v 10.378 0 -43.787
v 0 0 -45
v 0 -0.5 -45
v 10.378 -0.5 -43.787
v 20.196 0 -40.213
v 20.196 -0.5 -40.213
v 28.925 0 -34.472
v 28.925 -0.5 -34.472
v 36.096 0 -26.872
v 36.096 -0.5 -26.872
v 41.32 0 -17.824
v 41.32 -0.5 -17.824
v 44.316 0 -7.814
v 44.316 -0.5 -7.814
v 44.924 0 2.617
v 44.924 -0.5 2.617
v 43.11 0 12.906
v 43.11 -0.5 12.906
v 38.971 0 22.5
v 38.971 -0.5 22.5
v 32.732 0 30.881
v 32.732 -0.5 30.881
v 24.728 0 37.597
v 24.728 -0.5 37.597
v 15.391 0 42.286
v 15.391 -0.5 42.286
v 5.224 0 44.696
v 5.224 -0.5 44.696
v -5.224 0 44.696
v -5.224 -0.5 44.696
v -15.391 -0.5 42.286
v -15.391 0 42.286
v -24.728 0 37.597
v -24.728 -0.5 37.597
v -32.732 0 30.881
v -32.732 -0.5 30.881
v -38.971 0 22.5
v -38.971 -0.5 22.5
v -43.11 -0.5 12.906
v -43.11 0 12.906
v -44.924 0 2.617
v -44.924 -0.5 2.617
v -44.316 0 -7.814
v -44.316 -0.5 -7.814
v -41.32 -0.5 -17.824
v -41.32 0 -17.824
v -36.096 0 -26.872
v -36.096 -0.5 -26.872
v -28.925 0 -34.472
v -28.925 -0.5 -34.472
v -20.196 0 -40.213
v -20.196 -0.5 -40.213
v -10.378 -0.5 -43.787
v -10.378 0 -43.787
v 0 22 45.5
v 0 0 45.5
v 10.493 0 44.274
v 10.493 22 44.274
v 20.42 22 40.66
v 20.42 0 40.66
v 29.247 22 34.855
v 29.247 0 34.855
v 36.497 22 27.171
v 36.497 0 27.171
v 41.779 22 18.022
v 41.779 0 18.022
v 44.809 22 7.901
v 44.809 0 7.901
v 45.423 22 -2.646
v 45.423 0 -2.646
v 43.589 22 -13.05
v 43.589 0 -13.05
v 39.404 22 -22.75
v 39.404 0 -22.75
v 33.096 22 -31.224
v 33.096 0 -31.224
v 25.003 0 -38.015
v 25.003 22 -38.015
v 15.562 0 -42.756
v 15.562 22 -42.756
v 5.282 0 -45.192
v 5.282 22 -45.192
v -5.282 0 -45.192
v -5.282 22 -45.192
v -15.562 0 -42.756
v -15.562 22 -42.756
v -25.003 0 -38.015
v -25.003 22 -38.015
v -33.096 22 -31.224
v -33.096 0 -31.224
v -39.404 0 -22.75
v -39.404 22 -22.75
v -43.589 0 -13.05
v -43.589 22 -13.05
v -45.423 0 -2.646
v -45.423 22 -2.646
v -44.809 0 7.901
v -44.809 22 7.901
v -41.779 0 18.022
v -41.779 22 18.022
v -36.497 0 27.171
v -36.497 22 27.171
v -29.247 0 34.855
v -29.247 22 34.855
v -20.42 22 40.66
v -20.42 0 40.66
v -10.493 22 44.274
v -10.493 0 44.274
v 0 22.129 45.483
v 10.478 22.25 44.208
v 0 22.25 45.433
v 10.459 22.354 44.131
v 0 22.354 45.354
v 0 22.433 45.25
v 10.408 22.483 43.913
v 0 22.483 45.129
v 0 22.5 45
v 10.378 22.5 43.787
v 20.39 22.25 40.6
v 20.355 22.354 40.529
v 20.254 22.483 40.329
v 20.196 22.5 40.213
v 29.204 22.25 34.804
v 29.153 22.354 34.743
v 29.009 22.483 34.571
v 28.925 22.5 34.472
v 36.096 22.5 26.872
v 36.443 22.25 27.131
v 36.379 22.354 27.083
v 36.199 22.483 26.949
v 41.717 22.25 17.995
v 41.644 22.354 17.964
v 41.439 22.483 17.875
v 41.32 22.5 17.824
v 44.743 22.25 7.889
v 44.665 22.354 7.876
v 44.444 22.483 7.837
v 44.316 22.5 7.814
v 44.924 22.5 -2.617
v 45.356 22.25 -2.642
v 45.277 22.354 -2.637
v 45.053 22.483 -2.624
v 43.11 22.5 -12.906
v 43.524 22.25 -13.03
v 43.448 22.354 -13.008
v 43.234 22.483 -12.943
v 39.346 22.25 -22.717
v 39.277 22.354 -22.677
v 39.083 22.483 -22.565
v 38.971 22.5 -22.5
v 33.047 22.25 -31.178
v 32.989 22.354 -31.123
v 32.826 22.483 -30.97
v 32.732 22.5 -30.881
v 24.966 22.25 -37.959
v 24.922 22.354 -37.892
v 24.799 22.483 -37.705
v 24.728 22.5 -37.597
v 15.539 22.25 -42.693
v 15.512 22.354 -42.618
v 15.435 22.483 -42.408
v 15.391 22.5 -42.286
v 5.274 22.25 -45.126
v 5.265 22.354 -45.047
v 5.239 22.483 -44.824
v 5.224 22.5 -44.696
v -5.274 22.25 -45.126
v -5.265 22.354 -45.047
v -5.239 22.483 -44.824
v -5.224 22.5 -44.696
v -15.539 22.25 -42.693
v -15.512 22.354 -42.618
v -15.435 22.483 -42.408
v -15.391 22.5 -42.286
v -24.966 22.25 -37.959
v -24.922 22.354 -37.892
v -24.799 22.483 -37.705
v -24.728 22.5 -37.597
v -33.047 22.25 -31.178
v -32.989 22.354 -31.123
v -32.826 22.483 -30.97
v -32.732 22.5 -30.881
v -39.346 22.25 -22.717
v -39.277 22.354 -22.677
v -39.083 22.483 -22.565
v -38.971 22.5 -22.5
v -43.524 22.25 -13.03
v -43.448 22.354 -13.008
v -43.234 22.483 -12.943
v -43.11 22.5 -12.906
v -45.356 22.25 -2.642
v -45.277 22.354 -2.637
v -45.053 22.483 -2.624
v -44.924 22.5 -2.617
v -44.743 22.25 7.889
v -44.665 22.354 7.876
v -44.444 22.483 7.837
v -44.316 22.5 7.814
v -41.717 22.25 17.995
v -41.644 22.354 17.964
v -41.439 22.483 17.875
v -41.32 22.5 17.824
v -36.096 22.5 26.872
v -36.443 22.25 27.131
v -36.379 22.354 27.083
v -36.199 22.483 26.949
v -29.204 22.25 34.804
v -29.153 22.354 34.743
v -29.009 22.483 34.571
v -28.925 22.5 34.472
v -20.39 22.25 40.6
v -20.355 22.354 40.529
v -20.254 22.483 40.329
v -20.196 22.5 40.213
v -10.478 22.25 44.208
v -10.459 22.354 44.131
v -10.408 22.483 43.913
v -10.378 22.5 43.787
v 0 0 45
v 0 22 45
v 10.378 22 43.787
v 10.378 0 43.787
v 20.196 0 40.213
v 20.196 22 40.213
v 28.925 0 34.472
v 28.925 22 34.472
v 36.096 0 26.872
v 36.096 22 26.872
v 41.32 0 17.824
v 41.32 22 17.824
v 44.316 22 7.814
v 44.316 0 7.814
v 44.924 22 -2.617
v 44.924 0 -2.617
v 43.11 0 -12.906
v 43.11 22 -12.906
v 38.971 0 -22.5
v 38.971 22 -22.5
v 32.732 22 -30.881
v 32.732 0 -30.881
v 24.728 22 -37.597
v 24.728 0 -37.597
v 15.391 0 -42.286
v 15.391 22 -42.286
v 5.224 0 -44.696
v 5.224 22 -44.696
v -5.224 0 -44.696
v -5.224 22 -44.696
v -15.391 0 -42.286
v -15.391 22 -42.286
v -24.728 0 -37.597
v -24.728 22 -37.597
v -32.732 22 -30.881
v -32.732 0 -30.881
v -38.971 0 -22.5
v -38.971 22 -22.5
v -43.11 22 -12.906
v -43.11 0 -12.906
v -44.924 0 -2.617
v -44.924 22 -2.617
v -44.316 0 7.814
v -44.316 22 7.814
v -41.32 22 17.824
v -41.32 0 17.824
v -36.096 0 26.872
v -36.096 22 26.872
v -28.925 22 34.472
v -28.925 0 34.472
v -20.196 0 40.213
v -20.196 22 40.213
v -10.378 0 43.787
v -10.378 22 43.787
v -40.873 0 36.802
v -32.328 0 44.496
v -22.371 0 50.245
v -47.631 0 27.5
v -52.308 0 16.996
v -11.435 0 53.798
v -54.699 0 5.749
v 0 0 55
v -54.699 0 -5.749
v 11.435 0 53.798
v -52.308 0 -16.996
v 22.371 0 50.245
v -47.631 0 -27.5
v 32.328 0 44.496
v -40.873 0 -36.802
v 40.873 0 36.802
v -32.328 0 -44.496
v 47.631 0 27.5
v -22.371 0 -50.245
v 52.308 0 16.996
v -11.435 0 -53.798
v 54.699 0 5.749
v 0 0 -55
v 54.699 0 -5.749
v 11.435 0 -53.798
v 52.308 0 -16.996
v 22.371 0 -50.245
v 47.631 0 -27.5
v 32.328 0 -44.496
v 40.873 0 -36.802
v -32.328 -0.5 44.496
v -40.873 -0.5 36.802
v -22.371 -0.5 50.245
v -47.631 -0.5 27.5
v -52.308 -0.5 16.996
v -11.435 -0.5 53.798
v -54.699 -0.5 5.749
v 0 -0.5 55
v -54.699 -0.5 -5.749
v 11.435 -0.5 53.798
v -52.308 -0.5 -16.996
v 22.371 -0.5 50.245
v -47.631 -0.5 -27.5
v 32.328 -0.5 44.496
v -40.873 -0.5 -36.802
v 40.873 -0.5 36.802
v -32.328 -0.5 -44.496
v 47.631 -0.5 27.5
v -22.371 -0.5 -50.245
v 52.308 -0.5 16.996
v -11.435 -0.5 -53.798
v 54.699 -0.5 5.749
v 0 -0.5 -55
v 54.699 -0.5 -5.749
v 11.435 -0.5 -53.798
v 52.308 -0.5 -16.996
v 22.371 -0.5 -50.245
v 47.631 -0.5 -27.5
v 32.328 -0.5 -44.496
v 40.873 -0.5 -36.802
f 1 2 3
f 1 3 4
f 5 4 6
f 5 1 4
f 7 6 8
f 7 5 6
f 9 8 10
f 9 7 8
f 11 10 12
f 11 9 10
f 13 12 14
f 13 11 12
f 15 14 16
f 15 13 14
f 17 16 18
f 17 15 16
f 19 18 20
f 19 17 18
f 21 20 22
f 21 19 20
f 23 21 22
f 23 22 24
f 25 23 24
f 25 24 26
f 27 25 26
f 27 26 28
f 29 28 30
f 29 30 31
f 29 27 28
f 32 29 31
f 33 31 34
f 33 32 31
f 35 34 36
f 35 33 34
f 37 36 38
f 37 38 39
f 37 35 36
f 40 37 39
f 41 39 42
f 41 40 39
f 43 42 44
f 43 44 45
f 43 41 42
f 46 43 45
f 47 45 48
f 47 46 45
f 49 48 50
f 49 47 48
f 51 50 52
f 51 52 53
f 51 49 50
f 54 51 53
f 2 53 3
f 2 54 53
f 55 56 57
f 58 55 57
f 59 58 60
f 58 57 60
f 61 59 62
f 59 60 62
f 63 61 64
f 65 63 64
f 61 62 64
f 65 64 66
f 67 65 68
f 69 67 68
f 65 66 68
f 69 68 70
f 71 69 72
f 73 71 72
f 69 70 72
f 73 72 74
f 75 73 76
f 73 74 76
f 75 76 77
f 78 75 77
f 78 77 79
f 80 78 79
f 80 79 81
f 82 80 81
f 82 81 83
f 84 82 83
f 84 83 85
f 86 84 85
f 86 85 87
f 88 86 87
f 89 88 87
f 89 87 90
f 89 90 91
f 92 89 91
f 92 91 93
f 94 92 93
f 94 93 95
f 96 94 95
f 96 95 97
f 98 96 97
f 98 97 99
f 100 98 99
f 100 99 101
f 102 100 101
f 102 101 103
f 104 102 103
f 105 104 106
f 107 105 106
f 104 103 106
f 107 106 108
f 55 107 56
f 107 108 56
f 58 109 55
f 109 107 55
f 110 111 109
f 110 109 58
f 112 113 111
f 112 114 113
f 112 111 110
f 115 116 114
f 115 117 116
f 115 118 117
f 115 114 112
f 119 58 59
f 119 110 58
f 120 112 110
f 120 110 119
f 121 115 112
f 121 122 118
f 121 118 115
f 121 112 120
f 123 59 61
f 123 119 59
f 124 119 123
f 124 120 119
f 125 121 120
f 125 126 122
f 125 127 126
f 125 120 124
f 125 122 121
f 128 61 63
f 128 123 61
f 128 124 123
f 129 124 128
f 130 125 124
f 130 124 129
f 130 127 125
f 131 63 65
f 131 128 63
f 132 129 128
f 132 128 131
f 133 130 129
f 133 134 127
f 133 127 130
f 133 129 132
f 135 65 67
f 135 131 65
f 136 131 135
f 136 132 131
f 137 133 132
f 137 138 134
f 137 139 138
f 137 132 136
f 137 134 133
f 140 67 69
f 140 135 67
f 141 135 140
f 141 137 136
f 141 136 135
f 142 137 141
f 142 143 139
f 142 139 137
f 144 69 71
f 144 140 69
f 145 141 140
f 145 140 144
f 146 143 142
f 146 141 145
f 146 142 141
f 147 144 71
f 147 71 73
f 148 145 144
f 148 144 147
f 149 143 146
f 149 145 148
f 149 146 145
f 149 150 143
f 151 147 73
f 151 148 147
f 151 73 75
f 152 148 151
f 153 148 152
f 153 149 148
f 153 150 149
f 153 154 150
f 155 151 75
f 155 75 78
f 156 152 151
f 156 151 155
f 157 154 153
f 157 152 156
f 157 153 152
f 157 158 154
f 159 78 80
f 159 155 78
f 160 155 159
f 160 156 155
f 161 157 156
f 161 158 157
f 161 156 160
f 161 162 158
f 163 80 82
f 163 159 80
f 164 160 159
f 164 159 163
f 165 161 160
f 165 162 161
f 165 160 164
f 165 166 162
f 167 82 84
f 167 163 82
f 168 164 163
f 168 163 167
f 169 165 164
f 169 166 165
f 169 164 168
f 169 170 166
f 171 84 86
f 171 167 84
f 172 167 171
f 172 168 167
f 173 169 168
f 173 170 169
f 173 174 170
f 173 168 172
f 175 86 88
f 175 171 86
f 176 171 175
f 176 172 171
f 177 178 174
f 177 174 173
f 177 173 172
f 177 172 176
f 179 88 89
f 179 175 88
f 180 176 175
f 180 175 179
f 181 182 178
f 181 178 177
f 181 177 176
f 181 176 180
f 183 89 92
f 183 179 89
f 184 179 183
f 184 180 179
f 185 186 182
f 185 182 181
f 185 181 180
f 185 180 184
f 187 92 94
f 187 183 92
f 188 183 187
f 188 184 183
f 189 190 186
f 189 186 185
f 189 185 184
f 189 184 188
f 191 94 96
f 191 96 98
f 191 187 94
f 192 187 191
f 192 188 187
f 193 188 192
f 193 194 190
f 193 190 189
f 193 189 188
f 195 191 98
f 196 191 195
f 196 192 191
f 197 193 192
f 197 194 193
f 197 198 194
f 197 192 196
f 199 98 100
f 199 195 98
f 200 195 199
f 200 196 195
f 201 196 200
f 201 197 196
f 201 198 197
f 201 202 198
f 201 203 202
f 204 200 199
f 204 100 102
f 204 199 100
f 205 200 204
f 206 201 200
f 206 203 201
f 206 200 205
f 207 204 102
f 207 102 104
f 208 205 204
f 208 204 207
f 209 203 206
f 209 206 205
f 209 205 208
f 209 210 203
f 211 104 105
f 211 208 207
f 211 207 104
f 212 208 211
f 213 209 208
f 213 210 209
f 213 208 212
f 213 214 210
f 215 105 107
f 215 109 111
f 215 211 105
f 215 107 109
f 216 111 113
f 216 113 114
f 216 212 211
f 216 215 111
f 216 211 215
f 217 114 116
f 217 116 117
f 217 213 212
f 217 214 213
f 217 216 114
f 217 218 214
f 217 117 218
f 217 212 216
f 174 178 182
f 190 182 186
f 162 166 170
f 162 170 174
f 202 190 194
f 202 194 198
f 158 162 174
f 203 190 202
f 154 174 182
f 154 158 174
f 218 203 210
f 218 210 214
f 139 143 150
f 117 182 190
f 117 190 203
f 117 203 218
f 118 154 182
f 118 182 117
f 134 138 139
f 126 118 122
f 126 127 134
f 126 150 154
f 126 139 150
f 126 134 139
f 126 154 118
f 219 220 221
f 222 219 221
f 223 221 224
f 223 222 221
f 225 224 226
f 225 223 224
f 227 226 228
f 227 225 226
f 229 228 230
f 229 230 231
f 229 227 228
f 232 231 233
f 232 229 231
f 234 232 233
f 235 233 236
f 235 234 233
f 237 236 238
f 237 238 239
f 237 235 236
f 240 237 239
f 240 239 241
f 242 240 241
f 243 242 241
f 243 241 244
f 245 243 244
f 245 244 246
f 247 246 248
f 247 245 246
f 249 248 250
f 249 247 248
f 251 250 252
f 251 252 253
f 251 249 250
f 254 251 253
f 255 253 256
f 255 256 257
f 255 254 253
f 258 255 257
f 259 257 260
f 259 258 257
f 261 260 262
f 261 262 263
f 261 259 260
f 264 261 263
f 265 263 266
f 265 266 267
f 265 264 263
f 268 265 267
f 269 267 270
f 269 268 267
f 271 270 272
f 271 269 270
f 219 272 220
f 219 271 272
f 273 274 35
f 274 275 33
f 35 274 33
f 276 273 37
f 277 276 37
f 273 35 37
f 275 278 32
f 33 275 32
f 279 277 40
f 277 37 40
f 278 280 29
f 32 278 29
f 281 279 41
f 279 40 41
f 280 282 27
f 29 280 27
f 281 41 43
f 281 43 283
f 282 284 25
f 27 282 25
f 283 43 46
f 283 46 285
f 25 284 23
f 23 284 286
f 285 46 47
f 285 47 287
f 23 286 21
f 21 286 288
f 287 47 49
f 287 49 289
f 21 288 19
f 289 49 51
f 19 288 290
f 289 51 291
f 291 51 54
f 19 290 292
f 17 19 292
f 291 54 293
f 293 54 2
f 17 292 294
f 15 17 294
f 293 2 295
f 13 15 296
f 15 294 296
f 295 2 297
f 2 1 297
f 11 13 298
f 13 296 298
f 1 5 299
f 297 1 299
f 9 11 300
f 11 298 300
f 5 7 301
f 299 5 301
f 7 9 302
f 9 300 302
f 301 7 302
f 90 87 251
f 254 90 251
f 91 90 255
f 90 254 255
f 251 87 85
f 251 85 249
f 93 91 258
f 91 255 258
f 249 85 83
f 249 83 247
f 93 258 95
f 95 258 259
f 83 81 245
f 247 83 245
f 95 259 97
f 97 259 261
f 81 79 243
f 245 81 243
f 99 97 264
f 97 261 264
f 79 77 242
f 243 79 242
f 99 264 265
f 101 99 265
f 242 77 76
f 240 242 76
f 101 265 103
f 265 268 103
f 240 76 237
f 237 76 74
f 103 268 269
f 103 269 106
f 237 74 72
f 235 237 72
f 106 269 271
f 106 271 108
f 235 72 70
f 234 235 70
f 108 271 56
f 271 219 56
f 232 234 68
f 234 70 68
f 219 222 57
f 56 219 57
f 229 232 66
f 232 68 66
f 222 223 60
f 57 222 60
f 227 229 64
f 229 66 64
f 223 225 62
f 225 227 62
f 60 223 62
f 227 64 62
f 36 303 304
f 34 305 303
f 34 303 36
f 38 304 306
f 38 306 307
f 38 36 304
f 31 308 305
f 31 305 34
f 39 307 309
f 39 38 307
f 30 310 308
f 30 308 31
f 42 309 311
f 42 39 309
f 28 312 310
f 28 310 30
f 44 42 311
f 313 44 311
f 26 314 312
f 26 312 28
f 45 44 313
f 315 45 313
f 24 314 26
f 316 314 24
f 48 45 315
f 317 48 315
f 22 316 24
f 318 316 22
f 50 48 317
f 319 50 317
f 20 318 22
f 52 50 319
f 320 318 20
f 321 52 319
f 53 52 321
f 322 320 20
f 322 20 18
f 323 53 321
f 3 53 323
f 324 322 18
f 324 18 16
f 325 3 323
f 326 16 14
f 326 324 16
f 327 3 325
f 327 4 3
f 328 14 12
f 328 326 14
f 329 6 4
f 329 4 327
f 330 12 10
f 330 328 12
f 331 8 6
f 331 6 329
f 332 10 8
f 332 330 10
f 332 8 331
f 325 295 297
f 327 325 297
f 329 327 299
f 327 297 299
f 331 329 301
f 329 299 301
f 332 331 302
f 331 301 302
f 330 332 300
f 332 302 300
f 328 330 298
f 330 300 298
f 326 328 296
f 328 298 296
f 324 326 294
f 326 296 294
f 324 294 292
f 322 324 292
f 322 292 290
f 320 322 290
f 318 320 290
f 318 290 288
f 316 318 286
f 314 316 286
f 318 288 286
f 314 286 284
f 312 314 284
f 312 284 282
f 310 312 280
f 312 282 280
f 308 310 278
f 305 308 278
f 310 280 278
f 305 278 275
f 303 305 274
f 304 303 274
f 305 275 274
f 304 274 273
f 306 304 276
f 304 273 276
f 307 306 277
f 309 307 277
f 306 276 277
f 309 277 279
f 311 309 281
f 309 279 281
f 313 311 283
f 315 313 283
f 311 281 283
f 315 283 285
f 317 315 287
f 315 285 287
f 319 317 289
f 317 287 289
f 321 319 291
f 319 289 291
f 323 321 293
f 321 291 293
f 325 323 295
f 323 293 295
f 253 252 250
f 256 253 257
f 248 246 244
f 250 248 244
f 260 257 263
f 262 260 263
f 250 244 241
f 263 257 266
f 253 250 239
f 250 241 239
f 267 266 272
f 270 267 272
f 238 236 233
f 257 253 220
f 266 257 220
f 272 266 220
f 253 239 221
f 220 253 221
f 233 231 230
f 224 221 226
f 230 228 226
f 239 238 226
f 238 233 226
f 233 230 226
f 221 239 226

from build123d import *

# Parameters (mm, degrees)
SKETCH_1_R      = 45.5
SKETCH_1_R_2    = 45
EXTRUDE_1_DEPTH = 22
SKETCH_2_R      = 55
SKETCH_2_R_2    = 45
EXTRUDE_2_DEPTH = 0.5
SKETCH_3_R      = 45.5
EXTRUDE_3_DEPTH = 0.5
FILLET_2_R      = 0.5


with BuildPart() as part:
    # Эскиз1 → Вытянуть1 (new body)
    with BuildSketch(Plane(origin=(0, 0, 0), x_dir=(1, 0, 0), z_dir=(0, 1, 0))):
        with Locations(Location((0, 0, 0), (0, 0, 270))):
            Circle(SKETCH_1_R)
        with Locations(Location((0, 0, 0), (0, 0, 270))):
            Circle(SKETCH_1_R_2, mode=Mode.SUBTRACT)
    extrude(amount=EXTRUDE_1_DEPTH)

    # Эскиз3 → Вытянуть3 (add)
    with BuildSketch(Plane(origin=(0, 22, 0), x_dir=(1, 0, 0), z_dir=(0, 1, 0))):
        with Locations(Location((0, 0, 0), (0, 0, 270))):
            Circle(SKETCH_3_R)
    extrude(amount=EXTRUDE_3_DEPTH)

    # Скругление2
    fillet_2_edges = [part.edges().sort_by_distance(p)[0] for p in [
        (0, 22.5, -45.5),
    ]]
    fillet(fillet_2_edges, radius=FILLET_2_R)


with BuildPart() as body_2:
    # Эскиз2 → Вытянуть2 (new body)
    with BuildSketch(Plane.XZ):
        with Locations(Location((0, 0, 0), (0, 0, 270))):
            Circle(SKETCH_2_R)
        with Locations(Location((0, 0, 0), (0, 0, 270))):
            Circle(SKETCH_2_R_2, mode=Mode.SUBTRACT)
    extrude(amount=EXTRUDE_2_DEPTH)


solid = Compound([part.part, body_2.part])
